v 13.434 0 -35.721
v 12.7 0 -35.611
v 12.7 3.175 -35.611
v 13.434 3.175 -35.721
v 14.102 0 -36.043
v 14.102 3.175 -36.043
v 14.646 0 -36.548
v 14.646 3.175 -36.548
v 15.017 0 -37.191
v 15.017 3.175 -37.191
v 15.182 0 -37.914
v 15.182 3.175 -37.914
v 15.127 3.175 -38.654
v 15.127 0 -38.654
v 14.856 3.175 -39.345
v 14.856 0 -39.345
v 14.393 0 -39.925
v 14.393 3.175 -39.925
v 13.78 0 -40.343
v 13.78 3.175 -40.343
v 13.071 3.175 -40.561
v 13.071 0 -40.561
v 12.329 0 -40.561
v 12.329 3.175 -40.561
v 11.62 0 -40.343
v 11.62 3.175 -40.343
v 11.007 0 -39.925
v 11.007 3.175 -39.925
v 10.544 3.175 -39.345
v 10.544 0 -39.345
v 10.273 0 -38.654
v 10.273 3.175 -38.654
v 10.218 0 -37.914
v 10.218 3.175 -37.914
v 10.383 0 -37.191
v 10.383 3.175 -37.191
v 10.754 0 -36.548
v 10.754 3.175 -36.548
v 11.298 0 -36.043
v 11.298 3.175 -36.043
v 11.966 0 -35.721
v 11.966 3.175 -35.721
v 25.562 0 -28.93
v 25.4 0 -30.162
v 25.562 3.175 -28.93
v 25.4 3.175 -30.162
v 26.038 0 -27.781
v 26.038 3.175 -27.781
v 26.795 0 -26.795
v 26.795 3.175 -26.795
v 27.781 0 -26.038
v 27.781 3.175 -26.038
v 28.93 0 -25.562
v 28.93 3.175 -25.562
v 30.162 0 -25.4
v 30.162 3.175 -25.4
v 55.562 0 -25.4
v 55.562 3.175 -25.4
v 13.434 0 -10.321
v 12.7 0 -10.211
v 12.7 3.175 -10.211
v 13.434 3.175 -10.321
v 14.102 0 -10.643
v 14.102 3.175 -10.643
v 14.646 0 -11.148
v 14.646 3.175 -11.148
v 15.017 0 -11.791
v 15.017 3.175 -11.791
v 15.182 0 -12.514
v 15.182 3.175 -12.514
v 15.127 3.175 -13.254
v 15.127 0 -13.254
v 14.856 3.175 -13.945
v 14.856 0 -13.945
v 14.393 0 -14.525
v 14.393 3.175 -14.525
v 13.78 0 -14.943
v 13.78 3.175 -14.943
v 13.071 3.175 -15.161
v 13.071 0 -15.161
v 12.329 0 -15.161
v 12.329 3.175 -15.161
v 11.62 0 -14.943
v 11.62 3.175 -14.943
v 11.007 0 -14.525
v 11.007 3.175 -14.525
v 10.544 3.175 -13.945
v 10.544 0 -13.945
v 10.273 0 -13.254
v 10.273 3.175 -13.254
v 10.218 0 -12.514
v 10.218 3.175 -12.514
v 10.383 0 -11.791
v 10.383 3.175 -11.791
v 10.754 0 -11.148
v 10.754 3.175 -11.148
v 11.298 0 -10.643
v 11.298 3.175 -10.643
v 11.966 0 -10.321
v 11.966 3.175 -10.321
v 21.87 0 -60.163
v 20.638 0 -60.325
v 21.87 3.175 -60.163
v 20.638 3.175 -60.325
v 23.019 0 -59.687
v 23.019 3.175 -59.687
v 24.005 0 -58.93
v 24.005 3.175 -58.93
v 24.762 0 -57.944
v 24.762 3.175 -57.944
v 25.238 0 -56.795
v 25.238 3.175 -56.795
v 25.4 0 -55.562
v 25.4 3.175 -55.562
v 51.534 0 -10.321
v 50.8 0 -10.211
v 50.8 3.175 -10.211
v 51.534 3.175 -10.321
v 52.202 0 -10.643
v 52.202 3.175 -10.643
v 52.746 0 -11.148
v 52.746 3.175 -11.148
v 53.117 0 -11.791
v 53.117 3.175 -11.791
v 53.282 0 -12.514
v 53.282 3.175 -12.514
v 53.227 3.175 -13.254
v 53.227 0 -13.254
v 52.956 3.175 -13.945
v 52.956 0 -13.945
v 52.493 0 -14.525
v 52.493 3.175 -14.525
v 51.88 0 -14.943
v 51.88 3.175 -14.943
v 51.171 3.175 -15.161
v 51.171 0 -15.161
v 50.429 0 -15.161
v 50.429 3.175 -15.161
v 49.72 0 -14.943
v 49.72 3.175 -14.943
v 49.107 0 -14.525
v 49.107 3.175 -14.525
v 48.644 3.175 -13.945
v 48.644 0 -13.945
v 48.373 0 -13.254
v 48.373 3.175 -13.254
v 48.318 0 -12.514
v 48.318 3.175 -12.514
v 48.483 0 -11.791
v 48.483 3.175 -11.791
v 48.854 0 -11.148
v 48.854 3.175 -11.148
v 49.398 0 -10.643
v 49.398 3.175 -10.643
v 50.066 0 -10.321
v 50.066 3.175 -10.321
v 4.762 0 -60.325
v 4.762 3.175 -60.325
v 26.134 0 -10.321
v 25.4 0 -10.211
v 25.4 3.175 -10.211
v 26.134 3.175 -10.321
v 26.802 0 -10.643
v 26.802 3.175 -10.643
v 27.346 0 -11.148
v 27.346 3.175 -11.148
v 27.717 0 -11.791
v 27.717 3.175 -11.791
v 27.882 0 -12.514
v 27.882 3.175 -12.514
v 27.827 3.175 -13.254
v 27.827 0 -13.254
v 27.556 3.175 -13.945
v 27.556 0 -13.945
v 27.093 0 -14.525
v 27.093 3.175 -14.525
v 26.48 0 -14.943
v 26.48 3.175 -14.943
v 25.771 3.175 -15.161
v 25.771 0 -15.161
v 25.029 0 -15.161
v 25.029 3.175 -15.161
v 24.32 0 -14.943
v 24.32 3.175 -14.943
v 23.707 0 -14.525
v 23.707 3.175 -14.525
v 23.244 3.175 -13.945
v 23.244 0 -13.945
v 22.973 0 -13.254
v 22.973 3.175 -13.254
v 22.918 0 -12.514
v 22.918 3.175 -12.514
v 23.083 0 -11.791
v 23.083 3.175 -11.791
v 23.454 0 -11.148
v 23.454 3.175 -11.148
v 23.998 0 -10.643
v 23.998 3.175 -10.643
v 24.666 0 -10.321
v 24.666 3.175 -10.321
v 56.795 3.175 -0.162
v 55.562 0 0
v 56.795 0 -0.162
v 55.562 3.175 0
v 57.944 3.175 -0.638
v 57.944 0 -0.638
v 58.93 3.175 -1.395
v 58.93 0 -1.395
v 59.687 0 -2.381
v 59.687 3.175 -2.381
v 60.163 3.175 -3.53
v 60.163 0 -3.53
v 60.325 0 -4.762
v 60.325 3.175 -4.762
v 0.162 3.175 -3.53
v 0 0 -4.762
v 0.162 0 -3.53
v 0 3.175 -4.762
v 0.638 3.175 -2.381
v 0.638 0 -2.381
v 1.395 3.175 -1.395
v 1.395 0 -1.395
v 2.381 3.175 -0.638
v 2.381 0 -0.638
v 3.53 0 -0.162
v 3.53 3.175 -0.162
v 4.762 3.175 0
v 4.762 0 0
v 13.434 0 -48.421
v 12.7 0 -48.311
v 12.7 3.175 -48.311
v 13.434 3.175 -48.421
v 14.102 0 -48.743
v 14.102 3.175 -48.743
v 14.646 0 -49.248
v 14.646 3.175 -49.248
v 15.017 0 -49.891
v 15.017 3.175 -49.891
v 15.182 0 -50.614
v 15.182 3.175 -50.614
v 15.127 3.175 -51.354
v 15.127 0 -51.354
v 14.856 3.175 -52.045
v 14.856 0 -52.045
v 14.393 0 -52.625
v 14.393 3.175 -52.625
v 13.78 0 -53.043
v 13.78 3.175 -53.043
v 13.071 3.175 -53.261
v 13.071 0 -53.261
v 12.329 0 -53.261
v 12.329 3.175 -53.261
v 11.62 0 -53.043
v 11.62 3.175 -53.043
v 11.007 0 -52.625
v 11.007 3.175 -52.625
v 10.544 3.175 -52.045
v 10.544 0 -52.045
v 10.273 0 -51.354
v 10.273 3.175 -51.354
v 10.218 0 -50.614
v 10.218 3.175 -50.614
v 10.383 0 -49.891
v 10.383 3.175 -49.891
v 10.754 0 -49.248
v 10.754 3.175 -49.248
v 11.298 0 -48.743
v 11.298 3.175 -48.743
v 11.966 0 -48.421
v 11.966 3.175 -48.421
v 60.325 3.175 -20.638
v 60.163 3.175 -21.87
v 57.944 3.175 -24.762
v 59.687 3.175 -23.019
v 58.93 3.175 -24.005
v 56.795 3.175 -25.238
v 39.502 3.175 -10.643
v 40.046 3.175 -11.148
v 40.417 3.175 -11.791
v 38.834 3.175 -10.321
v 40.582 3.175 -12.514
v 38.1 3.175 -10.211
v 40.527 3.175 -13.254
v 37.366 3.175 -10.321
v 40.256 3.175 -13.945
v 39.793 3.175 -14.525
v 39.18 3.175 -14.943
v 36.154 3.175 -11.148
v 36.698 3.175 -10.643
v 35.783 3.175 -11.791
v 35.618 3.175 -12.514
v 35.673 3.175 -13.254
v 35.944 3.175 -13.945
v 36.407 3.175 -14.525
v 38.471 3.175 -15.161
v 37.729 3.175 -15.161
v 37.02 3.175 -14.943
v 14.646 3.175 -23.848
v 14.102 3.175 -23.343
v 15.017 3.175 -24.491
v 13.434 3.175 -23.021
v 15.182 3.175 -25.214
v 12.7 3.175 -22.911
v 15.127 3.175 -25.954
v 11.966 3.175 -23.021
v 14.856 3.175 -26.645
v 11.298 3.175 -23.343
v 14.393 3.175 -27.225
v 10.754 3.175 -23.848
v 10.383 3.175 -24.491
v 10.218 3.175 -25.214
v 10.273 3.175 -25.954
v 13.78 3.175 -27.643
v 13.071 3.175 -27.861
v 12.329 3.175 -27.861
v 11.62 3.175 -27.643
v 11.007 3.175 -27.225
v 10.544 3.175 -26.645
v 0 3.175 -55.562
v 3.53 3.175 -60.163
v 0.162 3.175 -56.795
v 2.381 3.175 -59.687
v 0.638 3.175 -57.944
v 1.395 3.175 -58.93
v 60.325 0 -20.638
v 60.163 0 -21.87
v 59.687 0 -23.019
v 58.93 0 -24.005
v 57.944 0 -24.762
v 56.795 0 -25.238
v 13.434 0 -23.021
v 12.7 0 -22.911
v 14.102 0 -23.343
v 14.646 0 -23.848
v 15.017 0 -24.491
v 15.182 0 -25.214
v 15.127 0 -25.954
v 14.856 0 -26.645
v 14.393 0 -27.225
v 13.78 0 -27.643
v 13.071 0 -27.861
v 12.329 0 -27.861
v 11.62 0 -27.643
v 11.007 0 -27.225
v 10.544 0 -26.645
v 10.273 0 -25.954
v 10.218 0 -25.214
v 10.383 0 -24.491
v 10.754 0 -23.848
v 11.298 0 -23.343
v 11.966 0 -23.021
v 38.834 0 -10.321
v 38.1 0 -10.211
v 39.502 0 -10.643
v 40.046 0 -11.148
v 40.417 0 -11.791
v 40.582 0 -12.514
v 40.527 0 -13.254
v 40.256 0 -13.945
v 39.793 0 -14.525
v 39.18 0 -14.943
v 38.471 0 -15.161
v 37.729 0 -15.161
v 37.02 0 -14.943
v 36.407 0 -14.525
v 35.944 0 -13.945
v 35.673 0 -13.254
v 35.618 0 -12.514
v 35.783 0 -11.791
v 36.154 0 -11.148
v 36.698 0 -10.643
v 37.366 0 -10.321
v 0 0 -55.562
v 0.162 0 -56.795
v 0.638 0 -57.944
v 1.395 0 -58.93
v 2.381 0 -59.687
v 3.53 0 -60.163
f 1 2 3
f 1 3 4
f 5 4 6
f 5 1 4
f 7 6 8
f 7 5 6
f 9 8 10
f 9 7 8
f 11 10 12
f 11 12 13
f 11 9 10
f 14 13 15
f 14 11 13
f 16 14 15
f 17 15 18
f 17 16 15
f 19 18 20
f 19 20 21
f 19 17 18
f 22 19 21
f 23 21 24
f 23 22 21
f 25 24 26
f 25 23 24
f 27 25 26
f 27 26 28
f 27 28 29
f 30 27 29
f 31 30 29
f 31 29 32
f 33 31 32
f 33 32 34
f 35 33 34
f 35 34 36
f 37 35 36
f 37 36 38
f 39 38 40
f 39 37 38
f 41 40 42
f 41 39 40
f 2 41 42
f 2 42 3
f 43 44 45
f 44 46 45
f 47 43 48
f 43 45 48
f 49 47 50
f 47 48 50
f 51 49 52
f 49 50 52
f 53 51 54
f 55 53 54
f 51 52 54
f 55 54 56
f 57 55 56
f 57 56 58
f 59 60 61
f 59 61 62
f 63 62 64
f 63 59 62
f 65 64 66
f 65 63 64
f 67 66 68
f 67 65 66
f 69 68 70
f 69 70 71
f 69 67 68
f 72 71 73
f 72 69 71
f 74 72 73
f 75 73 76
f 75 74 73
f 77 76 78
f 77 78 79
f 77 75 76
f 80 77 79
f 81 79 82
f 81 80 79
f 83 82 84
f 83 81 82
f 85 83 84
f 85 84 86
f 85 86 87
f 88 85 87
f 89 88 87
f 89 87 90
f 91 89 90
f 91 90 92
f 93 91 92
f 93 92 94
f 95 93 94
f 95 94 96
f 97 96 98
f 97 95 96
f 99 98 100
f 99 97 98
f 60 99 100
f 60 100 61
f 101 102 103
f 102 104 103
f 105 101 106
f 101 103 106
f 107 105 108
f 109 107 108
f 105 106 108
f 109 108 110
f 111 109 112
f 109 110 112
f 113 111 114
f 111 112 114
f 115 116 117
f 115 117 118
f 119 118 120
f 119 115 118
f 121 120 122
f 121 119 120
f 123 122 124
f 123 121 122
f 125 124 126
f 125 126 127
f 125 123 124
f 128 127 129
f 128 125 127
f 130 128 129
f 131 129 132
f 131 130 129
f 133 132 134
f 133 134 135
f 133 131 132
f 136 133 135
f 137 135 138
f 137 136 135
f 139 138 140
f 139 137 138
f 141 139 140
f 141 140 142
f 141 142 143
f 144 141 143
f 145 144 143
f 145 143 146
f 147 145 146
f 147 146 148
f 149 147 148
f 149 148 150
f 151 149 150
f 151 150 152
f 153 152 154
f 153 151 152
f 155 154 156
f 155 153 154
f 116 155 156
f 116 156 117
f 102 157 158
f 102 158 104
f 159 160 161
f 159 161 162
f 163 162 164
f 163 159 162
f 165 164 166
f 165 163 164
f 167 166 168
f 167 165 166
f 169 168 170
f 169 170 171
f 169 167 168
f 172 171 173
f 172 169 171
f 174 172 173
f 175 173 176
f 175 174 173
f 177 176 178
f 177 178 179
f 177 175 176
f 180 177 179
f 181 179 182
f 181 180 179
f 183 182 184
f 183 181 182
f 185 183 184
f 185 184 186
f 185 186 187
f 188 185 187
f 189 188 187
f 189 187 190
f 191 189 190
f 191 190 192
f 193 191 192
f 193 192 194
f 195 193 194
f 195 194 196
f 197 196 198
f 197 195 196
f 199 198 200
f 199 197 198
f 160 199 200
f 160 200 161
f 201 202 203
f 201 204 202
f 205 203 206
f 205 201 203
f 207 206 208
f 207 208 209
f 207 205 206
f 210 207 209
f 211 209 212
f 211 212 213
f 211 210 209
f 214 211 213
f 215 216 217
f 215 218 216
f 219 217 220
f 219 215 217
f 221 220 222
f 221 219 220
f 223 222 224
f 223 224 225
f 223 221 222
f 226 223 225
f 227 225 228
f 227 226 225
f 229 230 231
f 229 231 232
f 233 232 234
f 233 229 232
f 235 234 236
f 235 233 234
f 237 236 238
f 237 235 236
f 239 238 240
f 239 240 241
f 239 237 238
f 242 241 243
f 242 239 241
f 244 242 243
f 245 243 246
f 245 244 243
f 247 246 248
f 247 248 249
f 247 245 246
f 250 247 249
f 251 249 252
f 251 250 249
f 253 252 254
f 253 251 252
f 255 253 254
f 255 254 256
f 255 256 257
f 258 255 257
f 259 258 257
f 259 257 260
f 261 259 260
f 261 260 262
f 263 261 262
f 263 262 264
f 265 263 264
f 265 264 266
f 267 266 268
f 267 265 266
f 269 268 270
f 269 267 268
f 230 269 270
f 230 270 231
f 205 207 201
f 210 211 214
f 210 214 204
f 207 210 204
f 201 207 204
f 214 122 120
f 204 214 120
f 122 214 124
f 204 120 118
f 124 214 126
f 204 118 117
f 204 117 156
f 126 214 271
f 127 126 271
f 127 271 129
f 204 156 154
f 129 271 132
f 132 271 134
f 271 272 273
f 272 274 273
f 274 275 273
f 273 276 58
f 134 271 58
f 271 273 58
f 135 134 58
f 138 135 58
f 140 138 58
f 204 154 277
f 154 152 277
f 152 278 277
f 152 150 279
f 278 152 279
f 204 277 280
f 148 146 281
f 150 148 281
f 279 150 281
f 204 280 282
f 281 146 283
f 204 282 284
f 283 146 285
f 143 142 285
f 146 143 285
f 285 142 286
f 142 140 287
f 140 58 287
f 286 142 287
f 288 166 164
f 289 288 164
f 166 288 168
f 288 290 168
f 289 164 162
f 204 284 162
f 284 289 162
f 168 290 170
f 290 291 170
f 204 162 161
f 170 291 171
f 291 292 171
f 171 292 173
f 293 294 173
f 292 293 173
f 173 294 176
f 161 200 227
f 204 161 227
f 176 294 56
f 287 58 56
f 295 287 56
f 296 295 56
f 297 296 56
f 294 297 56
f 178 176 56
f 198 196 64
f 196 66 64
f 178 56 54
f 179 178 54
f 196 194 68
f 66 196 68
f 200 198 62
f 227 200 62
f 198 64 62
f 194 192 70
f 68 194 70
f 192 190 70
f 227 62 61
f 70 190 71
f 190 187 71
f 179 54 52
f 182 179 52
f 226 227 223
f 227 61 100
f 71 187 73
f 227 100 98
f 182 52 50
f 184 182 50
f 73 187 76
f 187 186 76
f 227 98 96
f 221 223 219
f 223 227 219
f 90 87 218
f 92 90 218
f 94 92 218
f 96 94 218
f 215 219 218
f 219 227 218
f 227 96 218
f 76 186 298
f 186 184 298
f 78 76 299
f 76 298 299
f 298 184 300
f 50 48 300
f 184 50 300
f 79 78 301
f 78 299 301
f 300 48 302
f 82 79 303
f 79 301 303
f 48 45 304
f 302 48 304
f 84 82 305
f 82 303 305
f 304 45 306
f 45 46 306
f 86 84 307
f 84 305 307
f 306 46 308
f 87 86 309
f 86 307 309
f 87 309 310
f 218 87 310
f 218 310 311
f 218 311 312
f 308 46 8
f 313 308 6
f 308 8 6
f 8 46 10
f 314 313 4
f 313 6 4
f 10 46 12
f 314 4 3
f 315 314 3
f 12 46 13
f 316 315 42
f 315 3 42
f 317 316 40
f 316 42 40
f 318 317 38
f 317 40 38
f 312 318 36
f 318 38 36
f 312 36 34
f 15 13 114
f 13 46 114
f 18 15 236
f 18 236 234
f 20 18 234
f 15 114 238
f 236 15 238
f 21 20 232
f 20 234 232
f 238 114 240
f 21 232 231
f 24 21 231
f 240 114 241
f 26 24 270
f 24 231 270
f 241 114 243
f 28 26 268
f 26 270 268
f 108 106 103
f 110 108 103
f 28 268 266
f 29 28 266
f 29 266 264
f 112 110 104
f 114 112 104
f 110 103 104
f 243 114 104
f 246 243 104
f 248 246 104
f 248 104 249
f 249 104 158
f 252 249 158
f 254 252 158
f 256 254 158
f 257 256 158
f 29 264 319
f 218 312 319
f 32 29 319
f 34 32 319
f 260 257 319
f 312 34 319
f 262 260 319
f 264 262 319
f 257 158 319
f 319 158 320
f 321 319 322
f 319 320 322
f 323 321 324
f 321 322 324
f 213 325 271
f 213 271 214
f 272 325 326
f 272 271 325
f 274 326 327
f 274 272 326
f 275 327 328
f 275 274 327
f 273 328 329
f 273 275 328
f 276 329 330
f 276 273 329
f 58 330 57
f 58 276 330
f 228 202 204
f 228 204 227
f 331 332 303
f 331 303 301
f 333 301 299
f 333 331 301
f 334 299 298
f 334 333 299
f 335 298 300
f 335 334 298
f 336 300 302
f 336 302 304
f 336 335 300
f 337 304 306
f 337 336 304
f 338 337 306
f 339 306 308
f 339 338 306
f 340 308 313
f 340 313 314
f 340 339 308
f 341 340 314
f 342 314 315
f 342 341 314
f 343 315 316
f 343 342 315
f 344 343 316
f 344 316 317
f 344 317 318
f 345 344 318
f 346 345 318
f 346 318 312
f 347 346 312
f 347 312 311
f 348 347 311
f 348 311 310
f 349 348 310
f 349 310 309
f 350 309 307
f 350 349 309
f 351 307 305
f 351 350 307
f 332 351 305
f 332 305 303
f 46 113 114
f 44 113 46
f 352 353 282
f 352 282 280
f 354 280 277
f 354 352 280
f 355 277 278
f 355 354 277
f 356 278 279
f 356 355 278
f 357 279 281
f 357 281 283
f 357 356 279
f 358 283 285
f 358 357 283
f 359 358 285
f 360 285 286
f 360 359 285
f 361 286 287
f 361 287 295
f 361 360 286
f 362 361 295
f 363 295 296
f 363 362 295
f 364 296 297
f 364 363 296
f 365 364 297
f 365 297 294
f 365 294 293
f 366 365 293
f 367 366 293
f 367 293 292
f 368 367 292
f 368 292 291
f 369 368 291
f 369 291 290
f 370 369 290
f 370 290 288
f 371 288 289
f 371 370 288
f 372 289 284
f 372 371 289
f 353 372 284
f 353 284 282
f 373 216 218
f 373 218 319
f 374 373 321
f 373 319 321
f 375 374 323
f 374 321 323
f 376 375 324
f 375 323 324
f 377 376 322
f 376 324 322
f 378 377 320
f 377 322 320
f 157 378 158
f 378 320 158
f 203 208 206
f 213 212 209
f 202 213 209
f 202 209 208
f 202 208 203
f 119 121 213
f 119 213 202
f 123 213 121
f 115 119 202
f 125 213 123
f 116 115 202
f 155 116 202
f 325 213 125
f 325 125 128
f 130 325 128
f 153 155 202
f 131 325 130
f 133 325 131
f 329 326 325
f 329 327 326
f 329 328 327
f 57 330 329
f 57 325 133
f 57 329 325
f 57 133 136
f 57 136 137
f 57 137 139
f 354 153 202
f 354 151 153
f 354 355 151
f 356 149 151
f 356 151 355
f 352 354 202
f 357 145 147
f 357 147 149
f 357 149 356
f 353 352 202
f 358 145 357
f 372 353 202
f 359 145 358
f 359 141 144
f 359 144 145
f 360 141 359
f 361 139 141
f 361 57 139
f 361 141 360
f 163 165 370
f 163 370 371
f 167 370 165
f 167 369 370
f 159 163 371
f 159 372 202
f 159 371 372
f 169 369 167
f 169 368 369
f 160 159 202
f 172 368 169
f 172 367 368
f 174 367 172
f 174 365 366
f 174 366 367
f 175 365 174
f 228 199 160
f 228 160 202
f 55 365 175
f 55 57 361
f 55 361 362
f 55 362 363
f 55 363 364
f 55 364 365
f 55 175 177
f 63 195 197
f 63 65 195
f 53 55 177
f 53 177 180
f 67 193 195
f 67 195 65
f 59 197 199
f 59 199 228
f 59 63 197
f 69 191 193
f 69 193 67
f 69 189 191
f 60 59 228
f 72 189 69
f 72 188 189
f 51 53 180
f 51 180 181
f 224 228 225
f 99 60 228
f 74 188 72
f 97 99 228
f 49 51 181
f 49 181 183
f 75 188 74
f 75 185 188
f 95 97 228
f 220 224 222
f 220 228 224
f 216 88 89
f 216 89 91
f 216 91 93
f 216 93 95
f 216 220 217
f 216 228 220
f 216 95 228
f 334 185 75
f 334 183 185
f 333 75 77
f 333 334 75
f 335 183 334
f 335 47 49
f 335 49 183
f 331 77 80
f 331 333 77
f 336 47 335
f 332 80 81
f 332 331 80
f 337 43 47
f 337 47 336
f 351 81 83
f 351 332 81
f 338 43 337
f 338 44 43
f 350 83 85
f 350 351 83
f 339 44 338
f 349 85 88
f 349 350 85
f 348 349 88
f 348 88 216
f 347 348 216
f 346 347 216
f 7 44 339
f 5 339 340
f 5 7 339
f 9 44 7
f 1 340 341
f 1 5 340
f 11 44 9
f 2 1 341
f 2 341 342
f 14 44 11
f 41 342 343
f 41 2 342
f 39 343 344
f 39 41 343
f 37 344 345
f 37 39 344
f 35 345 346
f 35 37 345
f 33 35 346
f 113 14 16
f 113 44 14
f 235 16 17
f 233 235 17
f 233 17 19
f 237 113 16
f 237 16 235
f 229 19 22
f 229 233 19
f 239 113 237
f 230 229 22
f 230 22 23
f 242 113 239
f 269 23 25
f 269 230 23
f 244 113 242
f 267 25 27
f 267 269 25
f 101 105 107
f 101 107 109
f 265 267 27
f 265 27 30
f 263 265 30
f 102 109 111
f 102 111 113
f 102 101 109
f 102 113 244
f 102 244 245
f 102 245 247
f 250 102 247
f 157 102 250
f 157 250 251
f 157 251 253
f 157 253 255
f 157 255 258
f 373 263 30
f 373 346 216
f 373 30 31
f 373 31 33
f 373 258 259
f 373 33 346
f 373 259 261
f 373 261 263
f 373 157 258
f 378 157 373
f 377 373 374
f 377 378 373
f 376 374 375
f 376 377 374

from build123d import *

# Parameters (mm, degrees)
SKETCH1_R           = 2.4892
BOSS_EXTRUDE1_DEPTH = 3.175
FILLET1_R           = 4.7625


with BuildPart() as part:
    # Sketch1 → Boss-Extrude1 (new body)
    with BuildSketch(Plane(origin=(0, 0, 0), x_dir=(1, 0, 0), z_dir=(0, 1, 0))):
        Polygon((0, 0), (0, 60.325), (25.4, 60.325), (25.4, 25.4), (60.325, 25.4), (60.325, 0), align=None)
        with Locations(Location((12.7, 12.7, 0), (0, 0, 270))):
            Circle(SKETCH1_R, mode=Mode.SUBTRACT)
        with Locations(Location((12.7, 25.4, 0), (0, 0, 270))):
            Circle(SKETCH1_R, mode=Mode.SUBTRACT)
        with Locations(Location((12.7, 38.1, 0), (0, 0, 270))):
            Circle(SKETCH1_R, mode=Mode.SUBTRACT)
        with Locations(Location((25.4, 12.7, 0), (0, 0, 270))):
            Circle(SKETCH1_R, mode=Mode.SUBTRACT)
        with Locations(Location((38.1, 12.7, 0), (0, 0, 270))):
            Circle(SKETCH1_R, mode=Mode.SUBTRACT)
        with Locations(Location((50.8, 12.7, 0), (0, 0, 270))):
            Circle(SKETCH1_R, mode=Mode.SUBTRACT)
        with Locations(Location((12.7, 50.8, 0), (0, 0, 270))):
            Circle(SKETCH1_R, mode=Mode.SUBTRACT)
    extrude(amount=BOSS_EXTRUDE1_DEPTH)

    # Fillet1
    fillet1_edges = [part.edges().sort_by_distance(p)[0] for p in [
        (0, 1.5875, 0),
        (0, 1.5875, -60.325),
        (25.4, 1.5875, -60.325),
        (25.4, 1.5875, -25.4),
        (60.325, 1.5875, -25.4),
        (60.325, 1.5875, 0),
    ]]
    fillet(fillet1_edges, radius=FILLET1_R)


solid = part.part
